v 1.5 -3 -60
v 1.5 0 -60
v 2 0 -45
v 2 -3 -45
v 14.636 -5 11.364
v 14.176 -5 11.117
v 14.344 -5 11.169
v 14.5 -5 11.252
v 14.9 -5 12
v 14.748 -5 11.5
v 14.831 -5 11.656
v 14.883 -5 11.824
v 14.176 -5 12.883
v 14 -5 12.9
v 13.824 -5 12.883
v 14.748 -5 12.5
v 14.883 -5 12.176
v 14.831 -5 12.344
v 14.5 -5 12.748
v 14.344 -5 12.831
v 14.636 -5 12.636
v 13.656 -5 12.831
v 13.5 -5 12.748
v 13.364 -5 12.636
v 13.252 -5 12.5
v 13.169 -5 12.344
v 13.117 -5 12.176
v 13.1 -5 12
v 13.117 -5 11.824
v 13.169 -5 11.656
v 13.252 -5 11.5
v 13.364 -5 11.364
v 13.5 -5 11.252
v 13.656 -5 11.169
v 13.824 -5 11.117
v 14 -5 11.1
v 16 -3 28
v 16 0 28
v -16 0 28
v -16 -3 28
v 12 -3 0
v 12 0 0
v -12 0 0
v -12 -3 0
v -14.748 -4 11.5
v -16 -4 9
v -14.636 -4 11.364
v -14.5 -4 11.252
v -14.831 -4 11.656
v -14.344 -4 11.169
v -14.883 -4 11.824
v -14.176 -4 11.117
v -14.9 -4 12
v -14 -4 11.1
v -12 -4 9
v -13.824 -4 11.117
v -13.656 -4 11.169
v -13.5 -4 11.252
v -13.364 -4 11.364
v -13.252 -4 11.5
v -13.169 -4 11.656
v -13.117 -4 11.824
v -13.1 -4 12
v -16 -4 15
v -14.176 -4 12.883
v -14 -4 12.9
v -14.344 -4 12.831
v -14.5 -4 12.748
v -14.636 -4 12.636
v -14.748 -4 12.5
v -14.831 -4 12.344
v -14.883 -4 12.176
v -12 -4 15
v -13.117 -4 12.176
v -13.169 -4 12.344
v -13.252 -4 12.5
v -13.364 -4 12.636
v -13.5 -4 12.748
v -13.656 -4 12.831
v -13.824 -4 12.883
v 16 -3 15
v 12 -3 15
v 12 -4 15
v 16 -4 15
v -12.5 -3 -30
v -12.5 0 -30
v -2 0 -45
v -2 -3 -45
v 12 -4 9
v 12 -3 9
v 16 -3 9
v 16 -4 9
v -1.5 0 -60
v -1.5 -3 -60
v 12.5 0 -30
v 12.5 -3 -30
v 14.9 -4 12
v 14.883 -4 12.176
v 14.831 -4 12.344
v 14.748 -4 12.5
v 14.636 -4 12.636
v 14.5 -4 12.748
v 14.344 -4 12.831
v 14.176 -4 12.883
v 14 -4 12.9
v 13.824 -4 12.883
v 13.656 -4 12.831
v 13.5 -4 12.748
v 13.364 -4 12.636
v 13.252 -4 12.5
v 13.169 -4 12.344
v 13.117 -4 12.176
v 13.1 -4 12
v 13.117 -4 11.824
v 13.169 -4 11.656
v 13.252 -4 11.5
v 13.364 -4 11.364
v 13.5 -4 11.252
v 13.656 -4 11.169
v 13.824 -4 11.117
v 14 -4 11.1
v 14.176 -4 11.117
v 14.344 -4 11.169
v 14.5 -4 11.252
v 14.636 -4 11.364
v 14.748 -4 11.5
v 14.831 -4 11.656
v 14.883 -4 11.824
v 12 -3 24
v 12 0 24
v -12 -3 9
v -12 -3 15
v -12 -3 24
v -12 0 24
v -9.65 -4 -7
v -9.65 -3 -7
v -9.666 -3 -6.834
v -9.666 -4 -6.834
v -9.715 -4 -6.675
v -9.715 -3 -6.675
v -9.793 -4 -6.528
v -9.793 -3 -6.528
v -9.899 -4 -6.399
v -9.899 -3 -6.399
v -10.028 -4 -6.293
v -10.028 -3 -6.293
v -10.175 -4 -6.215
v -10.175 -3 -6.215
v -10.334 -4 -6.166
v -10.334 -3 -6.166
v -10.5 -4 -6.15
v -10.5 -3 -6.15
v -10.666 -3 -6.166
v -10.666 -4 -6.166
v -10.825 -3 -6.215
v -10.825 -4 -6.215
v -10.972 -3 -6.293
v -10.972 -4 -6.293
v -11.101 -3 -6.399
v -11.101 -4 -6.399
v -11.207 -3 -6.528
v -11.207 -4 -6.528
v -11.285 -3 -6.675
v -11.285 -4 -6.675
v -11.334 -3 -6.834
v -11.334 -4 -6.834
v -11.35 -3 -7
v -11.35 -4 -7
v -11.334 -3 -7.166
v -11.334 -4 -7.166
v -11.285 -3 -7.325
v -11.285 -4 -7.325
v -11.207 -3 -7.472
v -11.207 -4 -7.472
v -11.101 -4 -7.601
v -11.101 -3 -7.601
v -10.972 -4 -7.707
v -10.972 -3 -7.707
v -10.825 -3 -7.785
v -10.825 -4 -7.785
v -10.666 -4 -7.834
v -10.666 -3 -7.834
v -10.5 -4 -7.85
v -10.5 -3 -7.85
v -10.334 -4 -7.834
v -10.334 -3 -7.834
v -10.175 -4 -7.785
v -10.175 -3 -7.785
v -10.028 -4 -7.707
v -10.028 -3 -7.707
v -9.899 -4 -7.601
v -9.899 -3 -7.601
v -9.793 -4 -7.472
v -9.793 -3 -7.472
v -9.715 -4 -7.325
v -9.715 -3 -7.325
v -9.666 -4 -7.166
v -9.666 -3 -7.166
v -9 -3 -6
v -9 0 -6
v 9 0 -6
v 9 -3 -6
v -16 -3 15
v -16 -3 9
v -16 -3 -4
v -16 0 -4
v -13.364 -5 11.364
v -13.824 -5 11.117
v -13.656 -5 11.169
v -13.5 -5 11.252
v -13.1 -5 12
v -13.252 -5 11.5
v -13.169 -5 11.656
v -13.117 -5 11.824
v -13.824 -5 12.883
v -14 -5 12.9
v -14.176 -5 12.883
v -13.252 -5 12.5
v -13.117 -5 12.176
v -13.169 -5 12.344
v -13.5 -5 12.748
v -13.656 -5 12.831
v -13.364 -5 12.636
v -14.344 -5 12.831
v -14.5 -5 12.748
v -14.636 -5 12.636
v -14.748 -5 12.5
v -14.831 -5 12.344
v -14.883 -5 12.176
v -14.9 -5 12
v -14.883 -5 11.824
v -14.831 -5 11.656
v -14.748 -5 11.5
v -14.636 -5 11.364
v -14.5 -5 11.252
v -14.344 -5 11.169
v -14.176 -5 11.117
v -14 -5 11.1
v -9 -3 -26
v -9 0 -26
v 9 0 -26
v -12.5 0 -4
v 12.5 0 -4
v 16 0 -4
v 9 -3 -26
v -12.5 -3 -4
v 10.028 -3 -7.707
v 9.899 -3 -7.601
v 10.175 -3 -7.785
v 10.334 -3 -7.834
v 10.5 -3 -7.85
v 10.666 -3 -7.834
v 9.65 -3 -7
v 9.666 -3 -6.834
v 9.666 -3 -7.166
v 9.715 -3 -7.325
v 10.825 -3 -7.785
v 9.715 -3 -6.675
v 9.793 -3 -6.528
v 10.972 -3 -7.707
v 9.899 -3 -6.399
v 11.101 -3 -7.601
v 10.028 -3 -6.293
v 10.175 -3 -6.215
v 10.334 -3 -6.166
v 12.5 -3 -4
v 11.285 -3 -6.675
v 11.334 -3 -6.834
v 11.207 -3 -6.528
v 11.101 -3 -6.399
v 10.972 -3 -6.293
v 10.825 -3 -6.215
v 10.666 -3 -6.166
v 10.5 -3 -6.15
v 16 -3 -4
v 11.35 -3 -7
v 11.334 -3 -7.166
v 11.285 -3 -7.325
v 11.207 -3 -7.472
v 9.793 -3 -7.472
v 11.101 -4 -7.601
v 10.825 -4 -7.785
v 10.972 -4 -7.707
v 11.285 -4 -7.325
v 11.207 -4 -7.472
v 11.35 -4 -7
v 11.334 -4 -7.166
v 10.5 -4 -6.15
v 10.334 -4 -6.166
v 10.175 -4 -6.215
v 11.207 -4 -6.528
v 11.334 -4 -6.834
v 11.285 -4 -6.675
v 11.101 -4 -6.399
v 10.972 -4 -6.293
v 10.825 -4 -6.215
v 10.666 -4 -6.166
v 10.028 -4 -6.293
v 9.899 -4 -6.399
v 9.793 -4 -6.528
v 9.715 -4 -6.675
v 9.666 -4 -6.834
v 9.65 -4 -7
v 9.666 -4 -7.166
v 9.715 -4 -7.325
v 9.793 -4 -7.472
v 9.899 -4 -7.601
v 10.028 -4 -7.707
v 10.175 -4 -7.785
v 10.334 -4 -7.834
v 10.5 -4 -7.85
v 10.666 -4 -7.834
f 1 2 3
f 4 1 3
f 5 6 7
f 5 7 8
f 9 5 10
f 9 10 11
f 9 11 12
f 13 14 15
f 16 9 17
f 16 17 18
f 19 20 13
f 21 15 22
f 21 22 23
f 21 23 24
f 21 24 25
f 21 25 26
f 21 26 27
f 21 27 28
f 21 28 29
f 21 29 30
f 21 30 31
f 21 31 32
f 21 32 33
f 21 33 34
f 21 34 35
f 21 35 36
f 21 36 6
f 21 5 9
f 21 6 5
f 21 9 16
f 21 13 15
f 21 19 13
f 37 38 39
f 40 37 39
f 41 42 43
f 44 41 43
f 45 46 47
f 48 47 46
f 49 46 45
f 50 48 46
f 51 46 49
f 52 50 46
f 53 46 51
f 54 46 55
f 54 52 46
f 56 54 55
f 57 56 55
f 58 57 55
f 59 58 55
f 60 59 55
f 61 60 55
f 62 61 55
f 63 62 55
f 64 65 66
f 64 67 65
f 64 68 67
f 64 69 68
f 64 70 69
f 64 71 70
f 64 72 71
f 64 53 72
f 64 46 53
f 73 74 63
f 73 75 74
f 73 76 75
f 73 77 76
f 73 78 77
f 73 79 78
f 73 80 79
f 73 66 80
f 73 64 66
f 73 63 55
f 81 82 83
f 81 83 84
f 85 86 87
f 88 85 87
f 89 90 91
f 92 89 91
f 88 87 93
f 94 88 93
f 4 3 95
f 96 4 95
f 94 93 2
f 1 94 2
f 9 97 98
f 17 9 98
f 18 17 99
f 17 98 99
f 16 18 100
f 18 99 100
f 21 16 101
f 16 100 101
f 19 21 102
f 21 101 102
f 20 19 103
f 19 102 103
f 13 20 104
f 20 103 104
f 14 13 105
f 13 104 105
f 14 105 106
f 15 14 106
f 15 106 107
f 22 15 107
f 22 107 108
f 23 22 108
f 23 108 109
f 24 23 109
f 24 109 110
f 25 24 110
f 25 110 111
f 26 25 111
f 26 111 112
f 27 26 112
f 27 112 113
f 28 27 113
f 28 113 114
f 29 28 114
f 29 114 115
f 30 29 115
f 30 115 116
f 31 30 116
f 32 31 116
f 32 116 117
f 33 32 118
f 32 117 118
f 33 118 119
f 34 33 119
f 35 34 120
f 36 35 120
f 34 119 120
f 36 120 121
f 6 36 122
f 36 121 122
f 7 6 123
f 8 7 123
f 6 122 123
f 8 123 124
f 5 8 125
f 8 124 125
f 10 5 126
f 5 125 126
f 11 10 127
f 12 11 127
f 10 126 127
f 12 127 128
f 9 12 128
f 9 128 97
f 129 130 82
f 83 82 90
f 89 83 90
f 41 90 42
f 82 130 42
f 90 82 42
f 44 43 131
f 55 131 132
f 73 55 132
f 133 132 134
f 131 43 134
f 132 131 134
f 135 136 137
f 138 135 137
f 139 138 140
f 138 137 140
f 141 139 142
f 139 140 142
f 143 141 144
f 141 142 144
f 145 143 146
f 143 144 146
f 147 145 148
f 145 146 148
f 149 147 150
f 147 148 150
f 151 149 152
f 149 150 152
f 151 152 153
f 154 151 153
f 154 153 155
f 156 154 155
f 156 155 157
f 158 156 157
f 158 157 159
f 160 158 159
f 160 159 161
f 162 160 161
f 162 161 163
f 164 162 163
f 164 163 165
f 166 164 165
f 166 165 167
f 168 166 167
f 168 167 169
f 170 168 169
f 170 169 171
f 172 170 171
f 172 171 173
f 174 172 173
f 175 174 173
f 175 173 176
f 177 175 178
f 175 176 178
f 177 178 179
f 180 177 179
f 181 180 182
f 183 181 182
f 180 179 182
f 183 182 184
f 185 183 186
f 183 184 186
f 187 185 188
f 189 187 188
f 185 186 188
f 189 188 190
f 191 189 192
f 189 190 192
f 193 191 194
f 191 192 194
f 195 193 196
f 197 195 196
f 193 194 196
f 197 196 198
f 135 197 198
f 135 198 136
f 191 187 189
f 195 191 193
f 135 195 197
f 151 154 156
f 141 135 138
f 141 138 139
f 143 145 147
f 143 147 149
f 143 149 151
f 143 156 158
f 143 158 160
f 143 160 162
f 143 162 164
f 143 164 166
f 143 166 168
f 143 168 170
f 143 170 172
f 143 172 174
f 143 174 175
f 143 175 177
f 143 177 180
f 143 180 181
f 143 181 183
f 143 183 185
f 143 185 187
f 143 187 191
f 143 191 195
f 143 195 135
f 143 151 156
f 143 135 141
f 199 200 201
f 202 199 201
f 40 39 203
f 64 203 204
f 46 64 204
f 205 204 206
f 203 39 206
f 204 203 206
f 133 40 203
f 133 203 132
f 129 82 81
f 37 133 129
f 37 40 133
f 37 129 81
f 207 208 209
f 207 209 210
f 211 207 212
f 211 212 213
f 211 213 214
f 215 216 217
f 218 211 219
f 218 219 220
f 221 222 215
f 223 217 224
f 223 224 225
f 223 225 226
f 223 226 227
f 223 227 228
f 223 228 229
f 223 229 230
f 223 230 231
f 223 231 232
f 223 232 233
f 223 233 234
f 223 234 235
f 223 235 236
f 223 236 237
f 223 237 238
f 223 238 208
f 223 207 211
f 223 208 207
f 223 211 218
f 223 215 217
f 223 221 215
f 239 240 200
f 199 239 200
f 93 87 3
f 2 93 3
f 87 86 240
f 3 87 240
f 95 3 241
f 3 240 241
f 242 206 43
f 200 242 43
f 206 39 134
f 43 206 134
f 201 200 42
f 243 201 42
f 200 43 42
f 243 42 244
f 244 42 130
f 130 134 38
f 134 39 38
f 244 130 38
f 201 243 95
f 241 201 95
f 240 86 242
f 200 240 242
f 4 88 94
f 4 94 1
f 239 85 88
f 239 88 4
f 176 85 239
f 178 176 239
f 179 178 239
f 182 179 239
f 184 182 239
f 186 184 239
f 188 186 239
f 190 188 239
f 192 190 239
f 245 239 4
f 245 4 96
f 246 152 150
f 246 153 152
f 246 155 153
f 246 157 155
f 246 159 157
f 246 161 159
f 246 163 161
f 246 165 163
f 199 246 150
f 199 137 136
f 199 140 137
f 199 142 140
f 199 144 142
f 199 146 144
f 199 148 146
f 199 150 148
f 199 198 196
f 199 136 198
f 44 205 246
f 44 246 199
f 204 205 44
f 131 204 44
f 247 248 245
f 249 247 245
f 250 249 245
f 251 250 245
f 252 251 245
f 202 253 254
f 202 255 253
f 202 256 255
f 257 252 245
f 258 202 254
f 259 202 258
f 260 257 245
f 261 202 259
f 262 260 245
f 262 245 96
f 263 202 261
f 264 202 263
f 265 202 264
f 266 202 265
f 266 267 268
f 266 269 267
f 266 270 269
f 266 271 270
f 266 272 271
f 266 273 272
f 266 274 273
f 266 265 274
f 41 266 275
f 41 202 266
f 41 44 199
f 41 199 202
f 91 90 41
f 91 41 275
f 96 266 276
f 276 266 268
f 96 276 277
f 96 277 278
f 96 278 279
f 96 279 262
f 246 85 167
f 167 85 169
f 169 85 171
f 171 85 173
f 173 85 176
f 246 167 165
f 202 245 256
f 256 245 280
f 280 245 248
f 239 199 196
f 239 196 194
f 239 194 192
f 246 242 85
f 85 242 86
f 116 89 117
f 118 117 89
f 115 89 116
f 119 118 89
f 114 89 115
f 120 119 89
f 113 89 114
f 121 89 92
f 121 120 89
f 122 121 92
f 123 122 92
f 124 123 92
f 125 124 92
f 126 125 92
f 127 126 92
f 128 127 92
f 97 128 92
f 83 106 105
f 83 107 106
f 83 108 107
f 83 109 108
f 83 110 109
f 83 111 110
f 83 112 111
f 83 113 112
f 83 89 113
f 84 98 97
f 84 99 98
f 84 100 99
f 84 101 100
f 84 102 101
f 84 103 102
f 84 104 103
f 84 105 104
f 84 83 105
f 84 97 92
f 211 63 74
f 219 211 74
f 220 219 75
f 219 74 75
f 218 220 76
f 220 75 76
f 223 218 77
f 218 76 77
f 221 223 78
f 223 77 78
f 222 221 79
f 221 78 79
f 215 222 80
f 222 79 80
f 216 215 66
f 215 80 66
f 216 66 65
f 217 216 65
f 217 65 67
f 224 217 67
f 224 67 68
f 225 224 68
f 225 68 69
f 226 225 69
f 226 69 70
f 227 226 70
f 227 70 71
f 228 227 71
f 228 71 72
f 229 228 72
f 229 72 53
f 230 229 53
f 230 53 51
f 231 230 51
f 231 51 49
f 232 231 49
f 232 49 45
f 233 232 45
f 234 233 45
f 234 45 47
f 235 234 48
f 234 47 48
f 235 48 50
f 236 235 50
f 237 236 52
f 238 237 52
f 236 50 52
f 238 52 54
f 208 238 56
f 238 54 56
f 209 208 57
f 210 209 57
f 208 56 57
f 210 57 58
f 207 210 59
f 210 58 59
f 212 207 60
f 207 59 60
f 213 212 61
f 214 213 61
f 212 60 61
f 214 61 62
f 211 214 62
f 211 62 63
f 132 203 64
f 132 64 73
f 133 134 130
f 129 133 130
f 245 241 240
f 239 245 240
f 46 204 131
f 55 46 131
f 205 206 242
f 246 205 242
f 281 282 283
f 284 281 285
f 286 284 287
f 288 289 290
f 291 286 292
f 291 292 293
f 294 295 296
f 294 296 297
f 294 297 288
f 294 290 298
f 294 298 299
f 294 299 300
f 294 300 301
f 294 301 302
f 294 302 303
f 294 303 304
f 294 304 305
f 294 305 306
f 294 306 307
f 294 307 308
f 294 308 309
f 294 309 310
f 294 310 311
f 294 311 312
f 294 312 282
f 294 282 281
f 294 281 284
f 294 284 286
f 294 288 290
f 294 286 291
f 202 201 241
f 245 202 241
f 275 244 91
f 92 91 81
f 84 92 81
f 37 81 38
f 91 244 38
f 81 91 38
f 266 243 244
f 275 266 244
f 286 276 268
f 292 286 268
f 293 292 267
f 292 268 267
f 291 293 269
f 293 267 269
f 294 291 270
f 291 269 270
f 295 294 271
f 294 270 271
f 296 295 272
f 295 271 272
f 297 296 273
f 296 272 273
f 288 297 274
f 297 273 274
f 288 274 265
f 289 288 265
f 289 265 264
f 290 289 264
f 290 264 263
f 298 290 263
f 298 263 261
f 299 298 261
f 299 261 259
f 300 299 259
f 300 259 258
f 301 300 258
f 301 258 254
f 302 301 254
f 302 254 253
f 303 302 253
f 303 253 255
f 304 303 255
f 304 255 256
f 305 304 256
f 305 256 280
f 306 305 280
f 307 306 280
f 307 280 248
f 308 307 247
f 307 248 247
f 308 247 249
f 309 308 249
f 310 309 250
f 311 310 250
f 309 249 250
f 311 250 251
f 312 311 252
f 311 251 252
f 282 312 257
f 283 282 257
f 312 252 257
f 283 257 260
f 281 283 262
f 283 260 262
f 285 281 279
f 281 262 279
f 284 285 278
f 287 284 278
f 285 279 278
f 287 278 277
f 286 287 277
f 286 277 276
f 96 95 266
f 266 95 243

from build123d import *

# Parameters (mm, degrees)
F0_R     = 0.9
F1_DEPTH = 5
F0_R_2   = 0.85
F2_DEPTH = 4
F0_W     = 4
F0_H     = 6
F3_DEPTH = 4
F4_DEPTH = 3
F5_DEPTH = 3


# Not quite as in the source:
# - a feature names something its author has since deleted; it is built from what else it names


with BuildPart() as f1:
    # F0 (on Front) → F1 (new body)
    with BuildSketch(Plane.XZ):
        with Locations((-14, 12)):
            Circle(F0_R)
    extrude(amount=F1_DEPTH)

    # F0 (on Front) → F3 (join)
    with BuildSketch(Plane.XZ):
        with Locations((-14, 12)):
            Rectangle(F0_W, F0_H)
        with Locations((-14, 12)):
            Circle(F0_R, mode=Mode.SUBTRACT)
    extrude(amount=F3_DEPTH)



with BuildPart() as f1b:
    # F0 (on Front) → F1, piece 2 (new body)
    with BuildSketch(Plane.XZ):
        with Locations((14, 12)):
            Circle(F0_R)
    extrude(amount=F1_DEPTH)

    # F0 (on Front) → F3, piece 2 (join)
    with BuildSketch(Plane.XZ):
        with Locations((14, 12)):
            Rectangle(F0_W, F0_H)
        with Locations((14, 12)):
            Circle(F0_R, mode=Mode.SUBTRACT)
    extrude(amount=F3_DEPTH)


with BuildPart() as f2:
    # F0 (on Front) → F2 (new body)
    with BuildSketch(Plane.XZ):
        with Locations((-10.5, -7)):
            Circle(F0_R_2)
    extrude(amount=F2_DEPTH)


with BuildPart() as f2b:
    # F0 (on Front) → F2, piece 2 (new body)
    with BuildSketch(Plane.XZ):
        with Locations((10.5, -7)):
            Circle(F0_R_2)
    extrude(amount=F2_DEPTH)


with BuildPart() as f1_1:
    add(f1.part)

    add(f1b.part)  # F4 merges F1b

    add(f2.part)  # F4 merges F2

    add(f2b.part)  # F4 merges F2b
    # F0 (on Front) → F4 (join)
    with BuildSketch(Plane.XZ):
        Polygon((-12, 24), (0, 24), (0, 28), (-16, 28), (-16, 15), (-12, 15), align=None)
        Polygon((0, 28), (0, 24), (12, 24), (12, 15), (16, 15), (16, 28), align=None)
        Polygon((0, 0), (0, -4), (12.5, -4), (16, -4), (16, 9), (12, 9), (12, 0), align=None)
        Polygon((-16, -4), (-12.5, -4), (0, -4), (0, 0), (-12, 0), (-12, 9), (-16, 9), align=None)
        Polygon((0, -4), (-12.5, -4), (-12.5, -30), (0, -30), (0, -26), (-9, -26), (-9, -6), (0, -6), align=None)
        with Locations((-10.5, -7)):
            Circle(F0_R_2, mode=Mode.SUBTRACT)
        Polygon((12.5, -4), (0, -4), (0, -6), (9, -6), (9, -26), (0, -26), (0, -30), (12.5, -30), align=None)
        with Locations((10.5, -7)):
            Circle(F0_R_2, mode=Mode.SUBTRACT)
    extrude(amount=F4_DEPTH)

    # F0 (on Front) → F5 (join)
    with BuildSketch(Plane.XZ):
        Polygon((0, -30), (-12.5, -30), (-2, -45), (2, -45), (12.5, -30), align=None)
        Polygon((2, -45), (-2, -45), (-1.5, -60), (1.5, -60), align=None)
    extrude(amount=F5_DEPTH)


solid = f1_1.part
